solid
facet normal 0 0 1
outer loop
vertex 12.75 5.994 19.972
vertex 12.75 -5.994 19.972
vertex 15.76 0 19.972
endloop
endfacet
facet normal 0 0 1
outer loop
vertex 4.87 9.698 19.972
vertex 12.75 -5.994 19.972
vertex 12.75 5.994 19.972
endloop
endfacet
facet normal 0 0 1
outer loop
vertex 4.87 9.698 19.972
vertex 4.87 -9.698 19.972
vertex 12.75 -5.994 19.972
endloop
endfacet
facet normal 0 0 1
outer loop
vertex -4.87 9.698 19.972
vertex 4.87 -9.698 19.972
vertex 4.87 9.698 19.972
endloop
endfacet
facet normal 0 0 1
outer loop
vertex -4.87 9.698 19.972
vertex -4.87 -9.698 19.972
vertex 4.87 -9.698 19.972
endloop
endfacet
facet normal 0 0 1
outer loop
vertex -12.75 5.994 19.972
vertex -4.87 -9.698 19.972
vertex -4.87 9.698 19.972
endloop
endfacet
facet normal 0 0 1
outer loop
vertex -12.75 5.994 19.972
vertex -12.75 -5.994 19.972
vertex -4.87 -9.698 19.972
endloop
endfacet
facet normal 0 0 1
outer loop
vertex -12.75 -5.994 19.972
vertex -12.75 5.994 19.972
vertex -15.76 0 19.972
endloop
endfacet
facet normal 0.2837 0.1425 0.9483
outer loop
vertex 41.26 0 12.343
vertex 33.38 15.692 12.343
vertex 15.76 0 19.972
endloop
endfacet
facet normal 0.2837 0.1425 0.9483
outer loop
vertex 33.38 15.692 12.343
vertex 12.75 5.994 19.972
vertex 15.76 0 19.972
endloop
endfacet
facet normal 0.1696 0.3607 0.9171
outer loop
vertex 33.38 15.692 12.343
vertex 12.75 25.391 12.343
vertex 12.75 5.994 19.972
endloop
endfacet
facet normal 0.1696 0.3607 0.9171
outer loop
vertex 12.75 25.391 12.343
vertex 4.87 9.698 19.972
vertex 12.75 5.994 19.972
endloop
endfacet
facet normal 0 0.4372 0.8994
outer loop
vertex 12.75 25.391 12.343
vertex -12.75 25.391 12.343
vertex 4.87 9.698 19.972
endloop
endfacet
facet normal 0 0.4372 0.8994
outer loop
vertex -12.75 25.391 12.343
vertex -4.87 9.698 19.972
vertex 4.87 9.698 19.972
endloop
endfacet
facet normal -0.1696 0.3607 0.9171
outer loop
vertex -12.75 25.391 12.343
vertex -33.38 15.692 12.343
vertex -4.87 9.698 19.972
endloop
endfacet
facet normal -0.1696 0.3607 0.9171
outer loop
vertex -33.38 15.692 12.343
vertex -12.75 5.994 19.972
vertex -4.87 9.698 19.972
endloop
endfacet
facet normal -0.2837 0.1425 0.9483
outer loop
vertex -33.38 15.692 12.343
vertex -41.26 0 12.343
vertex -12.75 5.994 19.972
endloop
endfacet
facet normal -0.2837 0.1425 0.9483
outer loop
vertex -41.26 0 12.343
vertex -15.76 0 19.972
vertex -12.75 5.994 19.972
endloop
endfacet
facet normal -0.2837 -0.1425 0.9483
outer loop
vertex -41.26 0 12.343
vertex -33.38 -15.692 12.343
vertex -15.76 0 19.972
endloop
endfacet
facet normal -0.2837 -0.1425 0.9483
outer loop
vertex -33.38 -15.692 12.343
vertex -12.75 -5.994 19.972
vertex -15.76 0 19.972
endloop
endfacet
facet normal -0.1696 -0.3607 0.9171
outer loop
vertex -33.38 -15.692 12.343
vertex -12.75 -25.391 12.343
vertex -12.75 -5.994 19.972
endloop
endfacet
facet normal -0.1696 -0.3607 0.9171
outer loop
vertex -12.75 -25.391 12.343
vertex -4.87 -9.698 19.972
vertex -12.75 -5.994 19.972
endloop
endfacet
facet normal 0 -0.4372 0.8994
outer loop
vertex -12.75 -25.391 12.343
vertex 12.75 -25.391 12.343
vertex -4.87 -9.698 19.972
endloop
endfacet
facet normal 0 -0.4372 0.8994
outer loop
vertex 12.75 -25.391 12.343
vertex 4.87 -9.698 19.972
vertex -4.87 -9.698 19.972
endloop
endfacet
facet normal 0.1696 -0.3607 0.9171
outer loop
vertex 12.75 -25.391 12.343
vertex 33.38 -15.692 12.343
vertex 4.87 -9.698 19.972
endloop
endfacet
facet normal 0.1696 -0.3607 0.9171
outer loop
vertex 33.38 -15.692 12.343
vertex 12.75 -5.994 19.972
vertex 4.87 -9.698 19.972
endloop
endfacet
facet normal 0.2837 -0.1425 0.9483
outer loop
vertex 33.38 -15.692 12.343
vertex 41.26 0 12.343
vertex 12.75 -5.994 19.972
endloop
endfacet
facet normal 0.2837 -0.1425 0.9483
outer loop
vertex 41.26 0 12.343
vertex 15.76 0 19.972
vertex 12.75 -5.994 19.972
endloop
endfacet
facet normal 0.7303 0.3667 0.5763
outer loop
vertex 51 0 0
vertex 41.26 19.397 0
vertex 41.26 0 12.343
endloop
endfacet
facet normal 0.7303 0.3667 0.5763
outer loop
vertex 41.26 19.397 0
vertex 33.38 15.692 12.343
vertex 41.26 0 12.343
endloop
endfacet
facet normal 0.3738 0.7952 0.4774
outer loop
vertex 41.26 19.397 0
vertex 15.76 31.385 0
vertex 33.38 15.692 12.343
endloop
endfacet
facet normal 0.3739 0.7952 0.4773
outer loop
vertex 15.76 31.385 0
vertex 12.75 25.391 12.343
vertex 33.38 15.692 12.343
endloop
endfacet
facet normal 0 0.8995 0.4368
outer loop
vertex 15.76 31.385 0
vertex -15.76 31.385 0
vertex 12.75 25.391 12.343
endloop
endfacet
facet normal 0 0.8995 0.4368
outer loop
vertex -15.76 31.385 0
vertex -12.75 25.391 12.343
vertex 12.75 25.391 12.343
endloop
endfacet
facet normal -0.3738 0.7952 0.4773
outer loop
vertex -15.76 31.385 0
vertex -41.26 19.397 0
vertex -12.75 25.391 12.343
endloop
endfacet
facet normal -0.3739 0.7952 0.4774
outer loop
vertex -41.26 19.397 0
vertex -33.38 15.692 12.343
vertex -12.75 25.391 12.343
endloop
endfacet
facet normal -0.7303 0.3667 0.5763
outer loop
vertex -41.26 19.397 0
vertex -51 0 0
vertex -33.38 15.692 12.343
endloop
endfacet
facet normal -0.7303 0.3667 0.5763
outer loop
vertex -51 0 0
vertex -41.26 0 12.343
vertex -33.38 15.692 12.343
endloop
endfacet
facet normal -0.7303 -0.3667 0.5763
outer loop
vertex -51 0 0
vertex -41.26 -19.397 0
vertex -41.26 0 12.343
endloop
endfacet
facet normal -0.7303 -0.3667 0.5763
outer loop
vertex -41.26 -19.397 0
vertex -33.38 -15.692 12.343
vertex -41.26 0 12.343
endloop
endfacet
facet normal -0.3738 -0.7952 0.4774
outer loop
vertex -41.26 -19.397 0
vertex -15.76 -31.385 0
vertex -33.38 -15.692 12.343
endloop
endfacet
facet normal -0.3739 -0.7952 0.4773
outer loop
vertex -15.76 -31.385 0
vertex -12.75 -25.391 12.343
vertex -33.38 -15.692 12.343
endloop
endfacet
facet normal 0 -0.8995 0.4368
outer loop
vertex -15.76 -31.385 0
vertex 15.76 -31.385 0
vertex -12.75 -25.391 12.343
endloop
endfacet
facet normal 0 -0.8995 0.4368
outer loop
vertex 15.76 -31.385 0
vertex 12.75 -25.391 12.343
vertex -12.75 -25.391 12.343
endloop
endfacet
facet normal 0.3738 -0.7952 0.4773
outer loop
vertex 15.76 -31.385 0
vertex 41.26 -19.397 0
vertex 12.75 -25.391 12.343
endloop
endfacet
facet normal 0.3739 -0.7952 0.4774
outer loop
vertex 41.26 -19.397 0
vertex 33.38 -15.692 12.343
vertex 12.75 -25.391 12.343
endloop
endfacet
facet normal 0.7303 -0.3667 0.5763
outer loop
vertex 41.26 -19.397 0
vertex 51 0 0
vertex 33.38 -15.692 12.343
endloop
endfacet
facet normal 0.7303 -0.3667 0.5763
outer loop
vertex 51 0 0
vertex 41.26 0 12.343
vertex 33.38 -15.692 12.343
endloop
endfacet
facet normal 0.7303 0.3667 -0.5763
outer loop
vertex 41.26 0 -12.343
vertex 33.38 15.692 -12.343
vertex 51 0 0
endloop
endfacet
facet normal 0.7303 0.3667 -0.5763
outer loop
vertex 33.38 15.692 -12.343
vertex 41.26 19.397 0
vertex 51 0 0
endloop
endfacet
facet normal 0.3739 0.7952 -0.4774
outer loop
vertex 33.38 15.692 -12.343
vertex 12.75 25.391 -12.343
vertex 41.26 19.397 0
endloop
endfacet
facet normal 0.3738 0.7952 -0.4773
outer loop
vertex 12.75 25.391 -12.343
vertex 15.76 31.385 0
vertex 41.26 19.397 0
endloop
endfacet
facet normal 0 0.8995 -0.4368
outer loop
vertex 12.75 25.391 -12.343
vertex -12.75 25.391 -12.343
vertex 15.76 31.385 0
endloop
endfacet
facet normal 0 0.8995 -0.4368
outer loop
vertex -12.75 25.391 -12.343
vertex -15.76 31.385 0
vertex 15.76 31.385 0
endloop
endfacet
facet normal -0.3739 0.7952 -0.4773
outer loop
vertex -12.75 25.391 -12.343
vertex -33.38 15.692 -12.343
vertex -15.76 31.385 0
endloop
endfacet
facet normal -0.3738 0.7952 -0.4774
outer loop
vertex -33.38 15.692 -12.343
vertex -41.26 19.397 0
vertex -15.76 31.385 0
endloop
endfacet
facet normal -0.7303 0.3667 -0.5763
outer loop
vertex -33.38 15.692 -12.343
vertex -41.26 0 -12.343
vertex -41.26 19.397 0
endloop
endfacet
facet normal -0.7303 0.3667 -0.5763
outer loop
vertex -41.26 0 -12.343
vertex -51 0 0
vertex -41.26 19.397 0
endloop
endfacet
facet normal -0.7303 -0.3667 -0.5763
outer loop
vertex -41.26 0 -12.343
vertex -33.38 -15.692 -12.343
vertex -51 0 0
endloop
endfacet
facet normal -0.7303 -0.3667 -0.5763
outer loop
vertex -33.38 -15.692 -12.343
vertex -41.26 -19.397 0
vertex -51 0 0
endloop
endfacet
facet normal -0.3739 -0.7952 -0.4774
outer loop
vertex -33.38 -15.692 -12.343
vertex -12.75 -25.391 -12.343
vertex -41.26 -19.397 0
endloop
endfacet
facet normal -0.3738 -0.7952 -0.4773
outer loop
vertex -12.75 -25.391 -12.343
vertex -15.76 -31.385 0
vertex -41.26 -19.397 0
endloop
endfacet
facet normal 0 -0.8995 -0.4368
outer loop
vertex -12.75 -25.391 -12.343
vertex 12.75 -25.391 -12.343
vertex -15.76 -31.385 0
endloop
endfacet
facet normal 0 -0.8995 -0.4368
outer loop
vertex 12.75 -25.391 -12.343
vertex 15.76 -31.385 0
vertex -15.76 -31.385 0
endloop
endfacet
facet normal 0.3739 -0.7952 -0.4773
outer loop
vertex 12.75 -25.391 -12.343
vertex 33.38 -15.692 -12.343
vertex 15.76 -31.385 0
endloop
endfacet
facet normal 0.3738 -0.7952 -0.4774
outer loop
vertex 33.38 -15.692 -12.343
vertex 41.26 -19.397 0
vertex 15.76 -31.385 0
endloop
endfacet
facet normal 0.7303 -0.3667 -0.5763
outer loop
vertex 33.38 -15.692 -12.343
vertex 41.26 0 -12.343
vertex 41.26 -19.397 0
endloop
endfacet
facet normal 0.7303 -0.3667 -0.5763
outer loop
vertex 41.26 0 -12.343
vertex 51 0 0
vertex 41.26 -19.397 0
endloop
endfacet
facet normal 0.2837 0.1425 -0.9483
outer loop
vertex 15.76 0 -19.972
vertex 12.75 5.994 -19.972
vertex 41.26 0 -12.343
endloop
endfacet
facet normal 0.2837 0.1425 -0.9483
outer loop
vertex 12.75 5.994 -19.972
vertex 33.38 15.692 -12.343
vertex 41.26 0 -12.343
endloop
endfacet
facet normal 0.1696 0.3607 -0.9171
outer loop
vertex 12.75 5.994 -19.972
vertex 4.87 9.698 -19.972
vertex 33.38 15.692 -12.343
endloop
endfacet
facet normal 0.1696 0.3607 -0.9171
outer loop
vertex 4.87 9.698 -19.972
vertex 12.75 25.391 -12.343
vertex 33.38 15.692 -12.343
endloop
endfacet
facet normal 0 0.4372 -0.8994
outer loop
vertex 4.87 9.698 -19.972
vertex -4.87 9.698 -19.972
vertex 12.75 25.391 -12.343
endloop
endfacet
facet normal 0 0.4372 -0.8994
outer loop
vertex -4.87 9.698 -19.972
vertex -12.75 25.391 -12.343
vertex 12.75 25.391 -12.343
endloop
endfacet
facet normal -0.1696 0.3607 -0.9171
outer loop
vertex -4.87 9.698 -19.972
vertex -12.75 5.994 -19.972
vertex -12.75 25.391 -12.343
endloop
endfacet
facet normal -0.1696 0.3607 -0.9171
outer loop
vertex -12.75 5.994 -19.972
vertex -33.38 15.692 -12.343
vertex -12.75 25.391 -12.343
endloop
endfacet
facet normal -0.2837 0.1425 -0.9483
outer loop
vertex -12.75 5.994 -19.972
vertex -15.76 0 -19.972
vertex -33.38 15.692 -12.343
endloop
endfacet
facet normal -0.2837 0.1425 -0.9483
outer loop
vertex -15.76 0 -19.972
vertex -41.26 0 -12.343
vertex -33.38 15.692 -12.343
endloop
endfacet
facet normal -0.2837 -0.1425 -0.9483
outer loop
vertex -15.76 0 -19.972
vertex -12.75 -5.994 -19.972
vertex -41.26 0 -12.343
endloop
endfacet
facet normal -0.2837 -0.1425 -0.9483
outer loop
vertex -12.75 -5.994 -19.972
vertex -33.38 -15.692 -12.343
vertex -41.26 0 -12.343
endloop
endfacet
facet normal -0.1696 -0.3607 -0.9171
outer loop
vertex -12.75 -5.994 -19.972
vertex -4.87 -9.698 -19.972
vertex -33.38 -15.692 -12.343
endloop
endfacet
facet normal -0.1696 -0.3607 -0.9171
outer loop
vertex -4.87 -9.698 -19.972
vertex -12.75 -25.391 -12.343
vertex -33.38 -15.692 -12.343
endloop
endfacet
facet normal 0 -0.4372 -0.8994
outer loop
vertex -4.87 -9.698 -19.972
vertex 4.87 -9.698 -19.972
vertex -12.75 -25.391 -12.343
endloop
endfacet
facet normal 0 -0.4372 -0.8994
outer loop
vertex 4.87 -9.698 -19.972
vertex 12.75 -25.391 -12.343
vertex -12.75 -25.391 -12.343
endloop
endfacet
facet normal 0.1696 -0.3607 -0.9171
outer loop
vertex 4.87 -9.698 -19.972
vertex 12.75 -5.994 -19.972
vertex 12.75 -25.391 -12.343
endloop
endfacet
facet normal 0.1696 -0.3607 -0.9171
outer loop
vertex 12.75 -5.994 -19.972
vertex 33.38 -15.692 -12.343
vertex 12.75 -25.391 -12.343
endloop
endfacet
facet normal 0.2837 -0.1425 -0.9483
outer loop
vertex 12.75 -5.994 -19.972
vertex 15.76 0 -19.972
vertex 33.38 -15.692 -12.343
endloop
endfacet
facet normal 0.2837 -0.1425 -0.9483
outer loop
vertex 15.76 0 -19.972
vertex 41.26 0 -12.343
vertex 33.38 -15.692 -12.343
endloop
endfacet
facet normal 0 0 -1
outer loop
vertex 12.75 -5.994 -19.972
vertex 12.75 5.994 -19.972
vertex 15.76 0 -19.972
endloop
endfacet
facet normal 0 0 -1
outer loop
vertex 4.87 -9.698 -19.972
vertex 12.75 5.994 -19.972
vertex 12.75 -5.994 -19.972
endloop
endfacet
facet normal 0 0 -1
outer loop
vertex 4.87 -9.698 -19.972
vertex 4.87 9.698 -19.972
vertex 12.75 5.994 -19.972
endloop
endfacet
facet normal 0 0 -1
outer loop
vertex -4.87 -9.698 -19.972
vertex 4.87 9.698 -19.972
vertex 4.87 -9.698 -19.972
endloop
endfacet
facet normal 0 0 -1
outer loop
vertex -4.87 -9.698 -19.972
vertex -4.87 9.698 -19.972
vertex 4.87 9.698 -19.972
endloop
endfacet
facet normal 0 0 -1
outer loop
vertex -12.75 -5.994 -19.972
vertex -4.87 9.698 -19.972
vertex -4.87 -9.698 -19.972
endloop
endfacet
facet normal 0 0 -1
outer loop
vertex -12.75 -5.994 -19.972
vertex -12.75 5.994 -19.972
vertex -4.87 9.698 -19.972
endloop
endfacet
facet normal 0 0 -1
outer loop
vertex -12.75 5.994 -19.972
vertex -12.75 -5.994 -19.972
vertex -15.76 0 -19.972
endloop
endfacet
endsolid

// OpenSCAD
// Generated by SolidPython 1.0.1 on 2020-07-29 00:46:53


scale(v = [17, 11, 7]) {
	sphere(r = 3);
}
/***********************************************
*********      SolidPython code:      **********
************************************************
 
# import packages: SolidPython
from solid import *
from solid.utils import *
from itertools import chain, combinations, permutations


class Resize:

    def __init__(self, scad_file):
        self.scad_file = scad_file
        #self.scad_file = import_scad(scad_file)
        # cone/cylinder param:
        self.r1 = 0
        self.r2 = 0
        self.h = 0
        # rectangular prism param:
        self.w = 0
        self.l = 0
        # ellipse param:
        self.r = 0

    # import OpenScad code (file name corresponds to shape)


    # classify shape + parameters
    def assign(self, param1, param2, param3):
        if self.scad_file == 'cone.scad':
            self.r1 = param1
            self.r2 = param2
            self.h = param3
        elif self.scad_file == 'cylinder.scad':
            self.r1 = param1
            self.r2 = param2
            self.h = param3
        elif self.scad_file == 'rectangularPrism.scad':
            self.h = param1
            self.l = param2
            self.w = param3
        else:
            self.r = param1
            self.h = param2

    # resize parameters
    def iterate(self):
        x = range(3, 20, 2)
        i = 1
        if self.scad_file == 'cone.scad':
            tempList = list(permutations(x, 2))
            for temp in tempList:
                param1 = temp[0]
                param2 = temp[1]
                filepath = 'produced_scad_files/' + 'cone' + str(param1) + '_' + str(param2) + '_' + '.scad'
                scad_render_to_file(cylinder(h=param1, r1=param2, r2=0), filepath)

        elif self.scad_file == 'cylinder.scad':
            tempList = list(permutations(x, 3))
            for temp in tempList:
                param1 = temp[0]
                param2 = temp[1]
                filepath = 'produced_scad_files/' + 'cylinder' + str(param1) + '_' + str(param2) + '_' + '.scad'
                scad_render_to_file(cylinder(h=param1, r1=param2, r2=param2), filepath)

        elif self.scad_file == 'rectangularPrism.scad':
            tempList = list(permutations(x, 3))
            for temp in tempList:
                param1 = temp[0]
                param2 = temp[1]
                param3 = temp[2]
                filepath = 'produced_scad_files/' + 'rectangularPrism' + str(param1) + '_' + str(param2) + '_' + str(
                    param3) + '.scad'
                scad_render_to_file(cube(size=(param1, param2, param3)), filepath)

        elif self.scad_file == 'ellipse.scad':
            tempList = list(permutations(x, 4))
            for temp in tempList:
                param1 = temp[0]
                param2 = temp[1]
                param3 = temp[2]
                param4 = temp[3]
                filepath = 'produced_scad_files/' + 'ellipse' + str(param1) + '_' + str(param2) + '_' + str(param3) + '_' + str(param4) + '.scad'
                scad_render_to_file(scale([param1, param2, param3])(sphere(r=param4)), filepath)

    def render_to_scadfile(self):
        scad_render_to_file(scad, 'example.scad') 
 
************************************************/
